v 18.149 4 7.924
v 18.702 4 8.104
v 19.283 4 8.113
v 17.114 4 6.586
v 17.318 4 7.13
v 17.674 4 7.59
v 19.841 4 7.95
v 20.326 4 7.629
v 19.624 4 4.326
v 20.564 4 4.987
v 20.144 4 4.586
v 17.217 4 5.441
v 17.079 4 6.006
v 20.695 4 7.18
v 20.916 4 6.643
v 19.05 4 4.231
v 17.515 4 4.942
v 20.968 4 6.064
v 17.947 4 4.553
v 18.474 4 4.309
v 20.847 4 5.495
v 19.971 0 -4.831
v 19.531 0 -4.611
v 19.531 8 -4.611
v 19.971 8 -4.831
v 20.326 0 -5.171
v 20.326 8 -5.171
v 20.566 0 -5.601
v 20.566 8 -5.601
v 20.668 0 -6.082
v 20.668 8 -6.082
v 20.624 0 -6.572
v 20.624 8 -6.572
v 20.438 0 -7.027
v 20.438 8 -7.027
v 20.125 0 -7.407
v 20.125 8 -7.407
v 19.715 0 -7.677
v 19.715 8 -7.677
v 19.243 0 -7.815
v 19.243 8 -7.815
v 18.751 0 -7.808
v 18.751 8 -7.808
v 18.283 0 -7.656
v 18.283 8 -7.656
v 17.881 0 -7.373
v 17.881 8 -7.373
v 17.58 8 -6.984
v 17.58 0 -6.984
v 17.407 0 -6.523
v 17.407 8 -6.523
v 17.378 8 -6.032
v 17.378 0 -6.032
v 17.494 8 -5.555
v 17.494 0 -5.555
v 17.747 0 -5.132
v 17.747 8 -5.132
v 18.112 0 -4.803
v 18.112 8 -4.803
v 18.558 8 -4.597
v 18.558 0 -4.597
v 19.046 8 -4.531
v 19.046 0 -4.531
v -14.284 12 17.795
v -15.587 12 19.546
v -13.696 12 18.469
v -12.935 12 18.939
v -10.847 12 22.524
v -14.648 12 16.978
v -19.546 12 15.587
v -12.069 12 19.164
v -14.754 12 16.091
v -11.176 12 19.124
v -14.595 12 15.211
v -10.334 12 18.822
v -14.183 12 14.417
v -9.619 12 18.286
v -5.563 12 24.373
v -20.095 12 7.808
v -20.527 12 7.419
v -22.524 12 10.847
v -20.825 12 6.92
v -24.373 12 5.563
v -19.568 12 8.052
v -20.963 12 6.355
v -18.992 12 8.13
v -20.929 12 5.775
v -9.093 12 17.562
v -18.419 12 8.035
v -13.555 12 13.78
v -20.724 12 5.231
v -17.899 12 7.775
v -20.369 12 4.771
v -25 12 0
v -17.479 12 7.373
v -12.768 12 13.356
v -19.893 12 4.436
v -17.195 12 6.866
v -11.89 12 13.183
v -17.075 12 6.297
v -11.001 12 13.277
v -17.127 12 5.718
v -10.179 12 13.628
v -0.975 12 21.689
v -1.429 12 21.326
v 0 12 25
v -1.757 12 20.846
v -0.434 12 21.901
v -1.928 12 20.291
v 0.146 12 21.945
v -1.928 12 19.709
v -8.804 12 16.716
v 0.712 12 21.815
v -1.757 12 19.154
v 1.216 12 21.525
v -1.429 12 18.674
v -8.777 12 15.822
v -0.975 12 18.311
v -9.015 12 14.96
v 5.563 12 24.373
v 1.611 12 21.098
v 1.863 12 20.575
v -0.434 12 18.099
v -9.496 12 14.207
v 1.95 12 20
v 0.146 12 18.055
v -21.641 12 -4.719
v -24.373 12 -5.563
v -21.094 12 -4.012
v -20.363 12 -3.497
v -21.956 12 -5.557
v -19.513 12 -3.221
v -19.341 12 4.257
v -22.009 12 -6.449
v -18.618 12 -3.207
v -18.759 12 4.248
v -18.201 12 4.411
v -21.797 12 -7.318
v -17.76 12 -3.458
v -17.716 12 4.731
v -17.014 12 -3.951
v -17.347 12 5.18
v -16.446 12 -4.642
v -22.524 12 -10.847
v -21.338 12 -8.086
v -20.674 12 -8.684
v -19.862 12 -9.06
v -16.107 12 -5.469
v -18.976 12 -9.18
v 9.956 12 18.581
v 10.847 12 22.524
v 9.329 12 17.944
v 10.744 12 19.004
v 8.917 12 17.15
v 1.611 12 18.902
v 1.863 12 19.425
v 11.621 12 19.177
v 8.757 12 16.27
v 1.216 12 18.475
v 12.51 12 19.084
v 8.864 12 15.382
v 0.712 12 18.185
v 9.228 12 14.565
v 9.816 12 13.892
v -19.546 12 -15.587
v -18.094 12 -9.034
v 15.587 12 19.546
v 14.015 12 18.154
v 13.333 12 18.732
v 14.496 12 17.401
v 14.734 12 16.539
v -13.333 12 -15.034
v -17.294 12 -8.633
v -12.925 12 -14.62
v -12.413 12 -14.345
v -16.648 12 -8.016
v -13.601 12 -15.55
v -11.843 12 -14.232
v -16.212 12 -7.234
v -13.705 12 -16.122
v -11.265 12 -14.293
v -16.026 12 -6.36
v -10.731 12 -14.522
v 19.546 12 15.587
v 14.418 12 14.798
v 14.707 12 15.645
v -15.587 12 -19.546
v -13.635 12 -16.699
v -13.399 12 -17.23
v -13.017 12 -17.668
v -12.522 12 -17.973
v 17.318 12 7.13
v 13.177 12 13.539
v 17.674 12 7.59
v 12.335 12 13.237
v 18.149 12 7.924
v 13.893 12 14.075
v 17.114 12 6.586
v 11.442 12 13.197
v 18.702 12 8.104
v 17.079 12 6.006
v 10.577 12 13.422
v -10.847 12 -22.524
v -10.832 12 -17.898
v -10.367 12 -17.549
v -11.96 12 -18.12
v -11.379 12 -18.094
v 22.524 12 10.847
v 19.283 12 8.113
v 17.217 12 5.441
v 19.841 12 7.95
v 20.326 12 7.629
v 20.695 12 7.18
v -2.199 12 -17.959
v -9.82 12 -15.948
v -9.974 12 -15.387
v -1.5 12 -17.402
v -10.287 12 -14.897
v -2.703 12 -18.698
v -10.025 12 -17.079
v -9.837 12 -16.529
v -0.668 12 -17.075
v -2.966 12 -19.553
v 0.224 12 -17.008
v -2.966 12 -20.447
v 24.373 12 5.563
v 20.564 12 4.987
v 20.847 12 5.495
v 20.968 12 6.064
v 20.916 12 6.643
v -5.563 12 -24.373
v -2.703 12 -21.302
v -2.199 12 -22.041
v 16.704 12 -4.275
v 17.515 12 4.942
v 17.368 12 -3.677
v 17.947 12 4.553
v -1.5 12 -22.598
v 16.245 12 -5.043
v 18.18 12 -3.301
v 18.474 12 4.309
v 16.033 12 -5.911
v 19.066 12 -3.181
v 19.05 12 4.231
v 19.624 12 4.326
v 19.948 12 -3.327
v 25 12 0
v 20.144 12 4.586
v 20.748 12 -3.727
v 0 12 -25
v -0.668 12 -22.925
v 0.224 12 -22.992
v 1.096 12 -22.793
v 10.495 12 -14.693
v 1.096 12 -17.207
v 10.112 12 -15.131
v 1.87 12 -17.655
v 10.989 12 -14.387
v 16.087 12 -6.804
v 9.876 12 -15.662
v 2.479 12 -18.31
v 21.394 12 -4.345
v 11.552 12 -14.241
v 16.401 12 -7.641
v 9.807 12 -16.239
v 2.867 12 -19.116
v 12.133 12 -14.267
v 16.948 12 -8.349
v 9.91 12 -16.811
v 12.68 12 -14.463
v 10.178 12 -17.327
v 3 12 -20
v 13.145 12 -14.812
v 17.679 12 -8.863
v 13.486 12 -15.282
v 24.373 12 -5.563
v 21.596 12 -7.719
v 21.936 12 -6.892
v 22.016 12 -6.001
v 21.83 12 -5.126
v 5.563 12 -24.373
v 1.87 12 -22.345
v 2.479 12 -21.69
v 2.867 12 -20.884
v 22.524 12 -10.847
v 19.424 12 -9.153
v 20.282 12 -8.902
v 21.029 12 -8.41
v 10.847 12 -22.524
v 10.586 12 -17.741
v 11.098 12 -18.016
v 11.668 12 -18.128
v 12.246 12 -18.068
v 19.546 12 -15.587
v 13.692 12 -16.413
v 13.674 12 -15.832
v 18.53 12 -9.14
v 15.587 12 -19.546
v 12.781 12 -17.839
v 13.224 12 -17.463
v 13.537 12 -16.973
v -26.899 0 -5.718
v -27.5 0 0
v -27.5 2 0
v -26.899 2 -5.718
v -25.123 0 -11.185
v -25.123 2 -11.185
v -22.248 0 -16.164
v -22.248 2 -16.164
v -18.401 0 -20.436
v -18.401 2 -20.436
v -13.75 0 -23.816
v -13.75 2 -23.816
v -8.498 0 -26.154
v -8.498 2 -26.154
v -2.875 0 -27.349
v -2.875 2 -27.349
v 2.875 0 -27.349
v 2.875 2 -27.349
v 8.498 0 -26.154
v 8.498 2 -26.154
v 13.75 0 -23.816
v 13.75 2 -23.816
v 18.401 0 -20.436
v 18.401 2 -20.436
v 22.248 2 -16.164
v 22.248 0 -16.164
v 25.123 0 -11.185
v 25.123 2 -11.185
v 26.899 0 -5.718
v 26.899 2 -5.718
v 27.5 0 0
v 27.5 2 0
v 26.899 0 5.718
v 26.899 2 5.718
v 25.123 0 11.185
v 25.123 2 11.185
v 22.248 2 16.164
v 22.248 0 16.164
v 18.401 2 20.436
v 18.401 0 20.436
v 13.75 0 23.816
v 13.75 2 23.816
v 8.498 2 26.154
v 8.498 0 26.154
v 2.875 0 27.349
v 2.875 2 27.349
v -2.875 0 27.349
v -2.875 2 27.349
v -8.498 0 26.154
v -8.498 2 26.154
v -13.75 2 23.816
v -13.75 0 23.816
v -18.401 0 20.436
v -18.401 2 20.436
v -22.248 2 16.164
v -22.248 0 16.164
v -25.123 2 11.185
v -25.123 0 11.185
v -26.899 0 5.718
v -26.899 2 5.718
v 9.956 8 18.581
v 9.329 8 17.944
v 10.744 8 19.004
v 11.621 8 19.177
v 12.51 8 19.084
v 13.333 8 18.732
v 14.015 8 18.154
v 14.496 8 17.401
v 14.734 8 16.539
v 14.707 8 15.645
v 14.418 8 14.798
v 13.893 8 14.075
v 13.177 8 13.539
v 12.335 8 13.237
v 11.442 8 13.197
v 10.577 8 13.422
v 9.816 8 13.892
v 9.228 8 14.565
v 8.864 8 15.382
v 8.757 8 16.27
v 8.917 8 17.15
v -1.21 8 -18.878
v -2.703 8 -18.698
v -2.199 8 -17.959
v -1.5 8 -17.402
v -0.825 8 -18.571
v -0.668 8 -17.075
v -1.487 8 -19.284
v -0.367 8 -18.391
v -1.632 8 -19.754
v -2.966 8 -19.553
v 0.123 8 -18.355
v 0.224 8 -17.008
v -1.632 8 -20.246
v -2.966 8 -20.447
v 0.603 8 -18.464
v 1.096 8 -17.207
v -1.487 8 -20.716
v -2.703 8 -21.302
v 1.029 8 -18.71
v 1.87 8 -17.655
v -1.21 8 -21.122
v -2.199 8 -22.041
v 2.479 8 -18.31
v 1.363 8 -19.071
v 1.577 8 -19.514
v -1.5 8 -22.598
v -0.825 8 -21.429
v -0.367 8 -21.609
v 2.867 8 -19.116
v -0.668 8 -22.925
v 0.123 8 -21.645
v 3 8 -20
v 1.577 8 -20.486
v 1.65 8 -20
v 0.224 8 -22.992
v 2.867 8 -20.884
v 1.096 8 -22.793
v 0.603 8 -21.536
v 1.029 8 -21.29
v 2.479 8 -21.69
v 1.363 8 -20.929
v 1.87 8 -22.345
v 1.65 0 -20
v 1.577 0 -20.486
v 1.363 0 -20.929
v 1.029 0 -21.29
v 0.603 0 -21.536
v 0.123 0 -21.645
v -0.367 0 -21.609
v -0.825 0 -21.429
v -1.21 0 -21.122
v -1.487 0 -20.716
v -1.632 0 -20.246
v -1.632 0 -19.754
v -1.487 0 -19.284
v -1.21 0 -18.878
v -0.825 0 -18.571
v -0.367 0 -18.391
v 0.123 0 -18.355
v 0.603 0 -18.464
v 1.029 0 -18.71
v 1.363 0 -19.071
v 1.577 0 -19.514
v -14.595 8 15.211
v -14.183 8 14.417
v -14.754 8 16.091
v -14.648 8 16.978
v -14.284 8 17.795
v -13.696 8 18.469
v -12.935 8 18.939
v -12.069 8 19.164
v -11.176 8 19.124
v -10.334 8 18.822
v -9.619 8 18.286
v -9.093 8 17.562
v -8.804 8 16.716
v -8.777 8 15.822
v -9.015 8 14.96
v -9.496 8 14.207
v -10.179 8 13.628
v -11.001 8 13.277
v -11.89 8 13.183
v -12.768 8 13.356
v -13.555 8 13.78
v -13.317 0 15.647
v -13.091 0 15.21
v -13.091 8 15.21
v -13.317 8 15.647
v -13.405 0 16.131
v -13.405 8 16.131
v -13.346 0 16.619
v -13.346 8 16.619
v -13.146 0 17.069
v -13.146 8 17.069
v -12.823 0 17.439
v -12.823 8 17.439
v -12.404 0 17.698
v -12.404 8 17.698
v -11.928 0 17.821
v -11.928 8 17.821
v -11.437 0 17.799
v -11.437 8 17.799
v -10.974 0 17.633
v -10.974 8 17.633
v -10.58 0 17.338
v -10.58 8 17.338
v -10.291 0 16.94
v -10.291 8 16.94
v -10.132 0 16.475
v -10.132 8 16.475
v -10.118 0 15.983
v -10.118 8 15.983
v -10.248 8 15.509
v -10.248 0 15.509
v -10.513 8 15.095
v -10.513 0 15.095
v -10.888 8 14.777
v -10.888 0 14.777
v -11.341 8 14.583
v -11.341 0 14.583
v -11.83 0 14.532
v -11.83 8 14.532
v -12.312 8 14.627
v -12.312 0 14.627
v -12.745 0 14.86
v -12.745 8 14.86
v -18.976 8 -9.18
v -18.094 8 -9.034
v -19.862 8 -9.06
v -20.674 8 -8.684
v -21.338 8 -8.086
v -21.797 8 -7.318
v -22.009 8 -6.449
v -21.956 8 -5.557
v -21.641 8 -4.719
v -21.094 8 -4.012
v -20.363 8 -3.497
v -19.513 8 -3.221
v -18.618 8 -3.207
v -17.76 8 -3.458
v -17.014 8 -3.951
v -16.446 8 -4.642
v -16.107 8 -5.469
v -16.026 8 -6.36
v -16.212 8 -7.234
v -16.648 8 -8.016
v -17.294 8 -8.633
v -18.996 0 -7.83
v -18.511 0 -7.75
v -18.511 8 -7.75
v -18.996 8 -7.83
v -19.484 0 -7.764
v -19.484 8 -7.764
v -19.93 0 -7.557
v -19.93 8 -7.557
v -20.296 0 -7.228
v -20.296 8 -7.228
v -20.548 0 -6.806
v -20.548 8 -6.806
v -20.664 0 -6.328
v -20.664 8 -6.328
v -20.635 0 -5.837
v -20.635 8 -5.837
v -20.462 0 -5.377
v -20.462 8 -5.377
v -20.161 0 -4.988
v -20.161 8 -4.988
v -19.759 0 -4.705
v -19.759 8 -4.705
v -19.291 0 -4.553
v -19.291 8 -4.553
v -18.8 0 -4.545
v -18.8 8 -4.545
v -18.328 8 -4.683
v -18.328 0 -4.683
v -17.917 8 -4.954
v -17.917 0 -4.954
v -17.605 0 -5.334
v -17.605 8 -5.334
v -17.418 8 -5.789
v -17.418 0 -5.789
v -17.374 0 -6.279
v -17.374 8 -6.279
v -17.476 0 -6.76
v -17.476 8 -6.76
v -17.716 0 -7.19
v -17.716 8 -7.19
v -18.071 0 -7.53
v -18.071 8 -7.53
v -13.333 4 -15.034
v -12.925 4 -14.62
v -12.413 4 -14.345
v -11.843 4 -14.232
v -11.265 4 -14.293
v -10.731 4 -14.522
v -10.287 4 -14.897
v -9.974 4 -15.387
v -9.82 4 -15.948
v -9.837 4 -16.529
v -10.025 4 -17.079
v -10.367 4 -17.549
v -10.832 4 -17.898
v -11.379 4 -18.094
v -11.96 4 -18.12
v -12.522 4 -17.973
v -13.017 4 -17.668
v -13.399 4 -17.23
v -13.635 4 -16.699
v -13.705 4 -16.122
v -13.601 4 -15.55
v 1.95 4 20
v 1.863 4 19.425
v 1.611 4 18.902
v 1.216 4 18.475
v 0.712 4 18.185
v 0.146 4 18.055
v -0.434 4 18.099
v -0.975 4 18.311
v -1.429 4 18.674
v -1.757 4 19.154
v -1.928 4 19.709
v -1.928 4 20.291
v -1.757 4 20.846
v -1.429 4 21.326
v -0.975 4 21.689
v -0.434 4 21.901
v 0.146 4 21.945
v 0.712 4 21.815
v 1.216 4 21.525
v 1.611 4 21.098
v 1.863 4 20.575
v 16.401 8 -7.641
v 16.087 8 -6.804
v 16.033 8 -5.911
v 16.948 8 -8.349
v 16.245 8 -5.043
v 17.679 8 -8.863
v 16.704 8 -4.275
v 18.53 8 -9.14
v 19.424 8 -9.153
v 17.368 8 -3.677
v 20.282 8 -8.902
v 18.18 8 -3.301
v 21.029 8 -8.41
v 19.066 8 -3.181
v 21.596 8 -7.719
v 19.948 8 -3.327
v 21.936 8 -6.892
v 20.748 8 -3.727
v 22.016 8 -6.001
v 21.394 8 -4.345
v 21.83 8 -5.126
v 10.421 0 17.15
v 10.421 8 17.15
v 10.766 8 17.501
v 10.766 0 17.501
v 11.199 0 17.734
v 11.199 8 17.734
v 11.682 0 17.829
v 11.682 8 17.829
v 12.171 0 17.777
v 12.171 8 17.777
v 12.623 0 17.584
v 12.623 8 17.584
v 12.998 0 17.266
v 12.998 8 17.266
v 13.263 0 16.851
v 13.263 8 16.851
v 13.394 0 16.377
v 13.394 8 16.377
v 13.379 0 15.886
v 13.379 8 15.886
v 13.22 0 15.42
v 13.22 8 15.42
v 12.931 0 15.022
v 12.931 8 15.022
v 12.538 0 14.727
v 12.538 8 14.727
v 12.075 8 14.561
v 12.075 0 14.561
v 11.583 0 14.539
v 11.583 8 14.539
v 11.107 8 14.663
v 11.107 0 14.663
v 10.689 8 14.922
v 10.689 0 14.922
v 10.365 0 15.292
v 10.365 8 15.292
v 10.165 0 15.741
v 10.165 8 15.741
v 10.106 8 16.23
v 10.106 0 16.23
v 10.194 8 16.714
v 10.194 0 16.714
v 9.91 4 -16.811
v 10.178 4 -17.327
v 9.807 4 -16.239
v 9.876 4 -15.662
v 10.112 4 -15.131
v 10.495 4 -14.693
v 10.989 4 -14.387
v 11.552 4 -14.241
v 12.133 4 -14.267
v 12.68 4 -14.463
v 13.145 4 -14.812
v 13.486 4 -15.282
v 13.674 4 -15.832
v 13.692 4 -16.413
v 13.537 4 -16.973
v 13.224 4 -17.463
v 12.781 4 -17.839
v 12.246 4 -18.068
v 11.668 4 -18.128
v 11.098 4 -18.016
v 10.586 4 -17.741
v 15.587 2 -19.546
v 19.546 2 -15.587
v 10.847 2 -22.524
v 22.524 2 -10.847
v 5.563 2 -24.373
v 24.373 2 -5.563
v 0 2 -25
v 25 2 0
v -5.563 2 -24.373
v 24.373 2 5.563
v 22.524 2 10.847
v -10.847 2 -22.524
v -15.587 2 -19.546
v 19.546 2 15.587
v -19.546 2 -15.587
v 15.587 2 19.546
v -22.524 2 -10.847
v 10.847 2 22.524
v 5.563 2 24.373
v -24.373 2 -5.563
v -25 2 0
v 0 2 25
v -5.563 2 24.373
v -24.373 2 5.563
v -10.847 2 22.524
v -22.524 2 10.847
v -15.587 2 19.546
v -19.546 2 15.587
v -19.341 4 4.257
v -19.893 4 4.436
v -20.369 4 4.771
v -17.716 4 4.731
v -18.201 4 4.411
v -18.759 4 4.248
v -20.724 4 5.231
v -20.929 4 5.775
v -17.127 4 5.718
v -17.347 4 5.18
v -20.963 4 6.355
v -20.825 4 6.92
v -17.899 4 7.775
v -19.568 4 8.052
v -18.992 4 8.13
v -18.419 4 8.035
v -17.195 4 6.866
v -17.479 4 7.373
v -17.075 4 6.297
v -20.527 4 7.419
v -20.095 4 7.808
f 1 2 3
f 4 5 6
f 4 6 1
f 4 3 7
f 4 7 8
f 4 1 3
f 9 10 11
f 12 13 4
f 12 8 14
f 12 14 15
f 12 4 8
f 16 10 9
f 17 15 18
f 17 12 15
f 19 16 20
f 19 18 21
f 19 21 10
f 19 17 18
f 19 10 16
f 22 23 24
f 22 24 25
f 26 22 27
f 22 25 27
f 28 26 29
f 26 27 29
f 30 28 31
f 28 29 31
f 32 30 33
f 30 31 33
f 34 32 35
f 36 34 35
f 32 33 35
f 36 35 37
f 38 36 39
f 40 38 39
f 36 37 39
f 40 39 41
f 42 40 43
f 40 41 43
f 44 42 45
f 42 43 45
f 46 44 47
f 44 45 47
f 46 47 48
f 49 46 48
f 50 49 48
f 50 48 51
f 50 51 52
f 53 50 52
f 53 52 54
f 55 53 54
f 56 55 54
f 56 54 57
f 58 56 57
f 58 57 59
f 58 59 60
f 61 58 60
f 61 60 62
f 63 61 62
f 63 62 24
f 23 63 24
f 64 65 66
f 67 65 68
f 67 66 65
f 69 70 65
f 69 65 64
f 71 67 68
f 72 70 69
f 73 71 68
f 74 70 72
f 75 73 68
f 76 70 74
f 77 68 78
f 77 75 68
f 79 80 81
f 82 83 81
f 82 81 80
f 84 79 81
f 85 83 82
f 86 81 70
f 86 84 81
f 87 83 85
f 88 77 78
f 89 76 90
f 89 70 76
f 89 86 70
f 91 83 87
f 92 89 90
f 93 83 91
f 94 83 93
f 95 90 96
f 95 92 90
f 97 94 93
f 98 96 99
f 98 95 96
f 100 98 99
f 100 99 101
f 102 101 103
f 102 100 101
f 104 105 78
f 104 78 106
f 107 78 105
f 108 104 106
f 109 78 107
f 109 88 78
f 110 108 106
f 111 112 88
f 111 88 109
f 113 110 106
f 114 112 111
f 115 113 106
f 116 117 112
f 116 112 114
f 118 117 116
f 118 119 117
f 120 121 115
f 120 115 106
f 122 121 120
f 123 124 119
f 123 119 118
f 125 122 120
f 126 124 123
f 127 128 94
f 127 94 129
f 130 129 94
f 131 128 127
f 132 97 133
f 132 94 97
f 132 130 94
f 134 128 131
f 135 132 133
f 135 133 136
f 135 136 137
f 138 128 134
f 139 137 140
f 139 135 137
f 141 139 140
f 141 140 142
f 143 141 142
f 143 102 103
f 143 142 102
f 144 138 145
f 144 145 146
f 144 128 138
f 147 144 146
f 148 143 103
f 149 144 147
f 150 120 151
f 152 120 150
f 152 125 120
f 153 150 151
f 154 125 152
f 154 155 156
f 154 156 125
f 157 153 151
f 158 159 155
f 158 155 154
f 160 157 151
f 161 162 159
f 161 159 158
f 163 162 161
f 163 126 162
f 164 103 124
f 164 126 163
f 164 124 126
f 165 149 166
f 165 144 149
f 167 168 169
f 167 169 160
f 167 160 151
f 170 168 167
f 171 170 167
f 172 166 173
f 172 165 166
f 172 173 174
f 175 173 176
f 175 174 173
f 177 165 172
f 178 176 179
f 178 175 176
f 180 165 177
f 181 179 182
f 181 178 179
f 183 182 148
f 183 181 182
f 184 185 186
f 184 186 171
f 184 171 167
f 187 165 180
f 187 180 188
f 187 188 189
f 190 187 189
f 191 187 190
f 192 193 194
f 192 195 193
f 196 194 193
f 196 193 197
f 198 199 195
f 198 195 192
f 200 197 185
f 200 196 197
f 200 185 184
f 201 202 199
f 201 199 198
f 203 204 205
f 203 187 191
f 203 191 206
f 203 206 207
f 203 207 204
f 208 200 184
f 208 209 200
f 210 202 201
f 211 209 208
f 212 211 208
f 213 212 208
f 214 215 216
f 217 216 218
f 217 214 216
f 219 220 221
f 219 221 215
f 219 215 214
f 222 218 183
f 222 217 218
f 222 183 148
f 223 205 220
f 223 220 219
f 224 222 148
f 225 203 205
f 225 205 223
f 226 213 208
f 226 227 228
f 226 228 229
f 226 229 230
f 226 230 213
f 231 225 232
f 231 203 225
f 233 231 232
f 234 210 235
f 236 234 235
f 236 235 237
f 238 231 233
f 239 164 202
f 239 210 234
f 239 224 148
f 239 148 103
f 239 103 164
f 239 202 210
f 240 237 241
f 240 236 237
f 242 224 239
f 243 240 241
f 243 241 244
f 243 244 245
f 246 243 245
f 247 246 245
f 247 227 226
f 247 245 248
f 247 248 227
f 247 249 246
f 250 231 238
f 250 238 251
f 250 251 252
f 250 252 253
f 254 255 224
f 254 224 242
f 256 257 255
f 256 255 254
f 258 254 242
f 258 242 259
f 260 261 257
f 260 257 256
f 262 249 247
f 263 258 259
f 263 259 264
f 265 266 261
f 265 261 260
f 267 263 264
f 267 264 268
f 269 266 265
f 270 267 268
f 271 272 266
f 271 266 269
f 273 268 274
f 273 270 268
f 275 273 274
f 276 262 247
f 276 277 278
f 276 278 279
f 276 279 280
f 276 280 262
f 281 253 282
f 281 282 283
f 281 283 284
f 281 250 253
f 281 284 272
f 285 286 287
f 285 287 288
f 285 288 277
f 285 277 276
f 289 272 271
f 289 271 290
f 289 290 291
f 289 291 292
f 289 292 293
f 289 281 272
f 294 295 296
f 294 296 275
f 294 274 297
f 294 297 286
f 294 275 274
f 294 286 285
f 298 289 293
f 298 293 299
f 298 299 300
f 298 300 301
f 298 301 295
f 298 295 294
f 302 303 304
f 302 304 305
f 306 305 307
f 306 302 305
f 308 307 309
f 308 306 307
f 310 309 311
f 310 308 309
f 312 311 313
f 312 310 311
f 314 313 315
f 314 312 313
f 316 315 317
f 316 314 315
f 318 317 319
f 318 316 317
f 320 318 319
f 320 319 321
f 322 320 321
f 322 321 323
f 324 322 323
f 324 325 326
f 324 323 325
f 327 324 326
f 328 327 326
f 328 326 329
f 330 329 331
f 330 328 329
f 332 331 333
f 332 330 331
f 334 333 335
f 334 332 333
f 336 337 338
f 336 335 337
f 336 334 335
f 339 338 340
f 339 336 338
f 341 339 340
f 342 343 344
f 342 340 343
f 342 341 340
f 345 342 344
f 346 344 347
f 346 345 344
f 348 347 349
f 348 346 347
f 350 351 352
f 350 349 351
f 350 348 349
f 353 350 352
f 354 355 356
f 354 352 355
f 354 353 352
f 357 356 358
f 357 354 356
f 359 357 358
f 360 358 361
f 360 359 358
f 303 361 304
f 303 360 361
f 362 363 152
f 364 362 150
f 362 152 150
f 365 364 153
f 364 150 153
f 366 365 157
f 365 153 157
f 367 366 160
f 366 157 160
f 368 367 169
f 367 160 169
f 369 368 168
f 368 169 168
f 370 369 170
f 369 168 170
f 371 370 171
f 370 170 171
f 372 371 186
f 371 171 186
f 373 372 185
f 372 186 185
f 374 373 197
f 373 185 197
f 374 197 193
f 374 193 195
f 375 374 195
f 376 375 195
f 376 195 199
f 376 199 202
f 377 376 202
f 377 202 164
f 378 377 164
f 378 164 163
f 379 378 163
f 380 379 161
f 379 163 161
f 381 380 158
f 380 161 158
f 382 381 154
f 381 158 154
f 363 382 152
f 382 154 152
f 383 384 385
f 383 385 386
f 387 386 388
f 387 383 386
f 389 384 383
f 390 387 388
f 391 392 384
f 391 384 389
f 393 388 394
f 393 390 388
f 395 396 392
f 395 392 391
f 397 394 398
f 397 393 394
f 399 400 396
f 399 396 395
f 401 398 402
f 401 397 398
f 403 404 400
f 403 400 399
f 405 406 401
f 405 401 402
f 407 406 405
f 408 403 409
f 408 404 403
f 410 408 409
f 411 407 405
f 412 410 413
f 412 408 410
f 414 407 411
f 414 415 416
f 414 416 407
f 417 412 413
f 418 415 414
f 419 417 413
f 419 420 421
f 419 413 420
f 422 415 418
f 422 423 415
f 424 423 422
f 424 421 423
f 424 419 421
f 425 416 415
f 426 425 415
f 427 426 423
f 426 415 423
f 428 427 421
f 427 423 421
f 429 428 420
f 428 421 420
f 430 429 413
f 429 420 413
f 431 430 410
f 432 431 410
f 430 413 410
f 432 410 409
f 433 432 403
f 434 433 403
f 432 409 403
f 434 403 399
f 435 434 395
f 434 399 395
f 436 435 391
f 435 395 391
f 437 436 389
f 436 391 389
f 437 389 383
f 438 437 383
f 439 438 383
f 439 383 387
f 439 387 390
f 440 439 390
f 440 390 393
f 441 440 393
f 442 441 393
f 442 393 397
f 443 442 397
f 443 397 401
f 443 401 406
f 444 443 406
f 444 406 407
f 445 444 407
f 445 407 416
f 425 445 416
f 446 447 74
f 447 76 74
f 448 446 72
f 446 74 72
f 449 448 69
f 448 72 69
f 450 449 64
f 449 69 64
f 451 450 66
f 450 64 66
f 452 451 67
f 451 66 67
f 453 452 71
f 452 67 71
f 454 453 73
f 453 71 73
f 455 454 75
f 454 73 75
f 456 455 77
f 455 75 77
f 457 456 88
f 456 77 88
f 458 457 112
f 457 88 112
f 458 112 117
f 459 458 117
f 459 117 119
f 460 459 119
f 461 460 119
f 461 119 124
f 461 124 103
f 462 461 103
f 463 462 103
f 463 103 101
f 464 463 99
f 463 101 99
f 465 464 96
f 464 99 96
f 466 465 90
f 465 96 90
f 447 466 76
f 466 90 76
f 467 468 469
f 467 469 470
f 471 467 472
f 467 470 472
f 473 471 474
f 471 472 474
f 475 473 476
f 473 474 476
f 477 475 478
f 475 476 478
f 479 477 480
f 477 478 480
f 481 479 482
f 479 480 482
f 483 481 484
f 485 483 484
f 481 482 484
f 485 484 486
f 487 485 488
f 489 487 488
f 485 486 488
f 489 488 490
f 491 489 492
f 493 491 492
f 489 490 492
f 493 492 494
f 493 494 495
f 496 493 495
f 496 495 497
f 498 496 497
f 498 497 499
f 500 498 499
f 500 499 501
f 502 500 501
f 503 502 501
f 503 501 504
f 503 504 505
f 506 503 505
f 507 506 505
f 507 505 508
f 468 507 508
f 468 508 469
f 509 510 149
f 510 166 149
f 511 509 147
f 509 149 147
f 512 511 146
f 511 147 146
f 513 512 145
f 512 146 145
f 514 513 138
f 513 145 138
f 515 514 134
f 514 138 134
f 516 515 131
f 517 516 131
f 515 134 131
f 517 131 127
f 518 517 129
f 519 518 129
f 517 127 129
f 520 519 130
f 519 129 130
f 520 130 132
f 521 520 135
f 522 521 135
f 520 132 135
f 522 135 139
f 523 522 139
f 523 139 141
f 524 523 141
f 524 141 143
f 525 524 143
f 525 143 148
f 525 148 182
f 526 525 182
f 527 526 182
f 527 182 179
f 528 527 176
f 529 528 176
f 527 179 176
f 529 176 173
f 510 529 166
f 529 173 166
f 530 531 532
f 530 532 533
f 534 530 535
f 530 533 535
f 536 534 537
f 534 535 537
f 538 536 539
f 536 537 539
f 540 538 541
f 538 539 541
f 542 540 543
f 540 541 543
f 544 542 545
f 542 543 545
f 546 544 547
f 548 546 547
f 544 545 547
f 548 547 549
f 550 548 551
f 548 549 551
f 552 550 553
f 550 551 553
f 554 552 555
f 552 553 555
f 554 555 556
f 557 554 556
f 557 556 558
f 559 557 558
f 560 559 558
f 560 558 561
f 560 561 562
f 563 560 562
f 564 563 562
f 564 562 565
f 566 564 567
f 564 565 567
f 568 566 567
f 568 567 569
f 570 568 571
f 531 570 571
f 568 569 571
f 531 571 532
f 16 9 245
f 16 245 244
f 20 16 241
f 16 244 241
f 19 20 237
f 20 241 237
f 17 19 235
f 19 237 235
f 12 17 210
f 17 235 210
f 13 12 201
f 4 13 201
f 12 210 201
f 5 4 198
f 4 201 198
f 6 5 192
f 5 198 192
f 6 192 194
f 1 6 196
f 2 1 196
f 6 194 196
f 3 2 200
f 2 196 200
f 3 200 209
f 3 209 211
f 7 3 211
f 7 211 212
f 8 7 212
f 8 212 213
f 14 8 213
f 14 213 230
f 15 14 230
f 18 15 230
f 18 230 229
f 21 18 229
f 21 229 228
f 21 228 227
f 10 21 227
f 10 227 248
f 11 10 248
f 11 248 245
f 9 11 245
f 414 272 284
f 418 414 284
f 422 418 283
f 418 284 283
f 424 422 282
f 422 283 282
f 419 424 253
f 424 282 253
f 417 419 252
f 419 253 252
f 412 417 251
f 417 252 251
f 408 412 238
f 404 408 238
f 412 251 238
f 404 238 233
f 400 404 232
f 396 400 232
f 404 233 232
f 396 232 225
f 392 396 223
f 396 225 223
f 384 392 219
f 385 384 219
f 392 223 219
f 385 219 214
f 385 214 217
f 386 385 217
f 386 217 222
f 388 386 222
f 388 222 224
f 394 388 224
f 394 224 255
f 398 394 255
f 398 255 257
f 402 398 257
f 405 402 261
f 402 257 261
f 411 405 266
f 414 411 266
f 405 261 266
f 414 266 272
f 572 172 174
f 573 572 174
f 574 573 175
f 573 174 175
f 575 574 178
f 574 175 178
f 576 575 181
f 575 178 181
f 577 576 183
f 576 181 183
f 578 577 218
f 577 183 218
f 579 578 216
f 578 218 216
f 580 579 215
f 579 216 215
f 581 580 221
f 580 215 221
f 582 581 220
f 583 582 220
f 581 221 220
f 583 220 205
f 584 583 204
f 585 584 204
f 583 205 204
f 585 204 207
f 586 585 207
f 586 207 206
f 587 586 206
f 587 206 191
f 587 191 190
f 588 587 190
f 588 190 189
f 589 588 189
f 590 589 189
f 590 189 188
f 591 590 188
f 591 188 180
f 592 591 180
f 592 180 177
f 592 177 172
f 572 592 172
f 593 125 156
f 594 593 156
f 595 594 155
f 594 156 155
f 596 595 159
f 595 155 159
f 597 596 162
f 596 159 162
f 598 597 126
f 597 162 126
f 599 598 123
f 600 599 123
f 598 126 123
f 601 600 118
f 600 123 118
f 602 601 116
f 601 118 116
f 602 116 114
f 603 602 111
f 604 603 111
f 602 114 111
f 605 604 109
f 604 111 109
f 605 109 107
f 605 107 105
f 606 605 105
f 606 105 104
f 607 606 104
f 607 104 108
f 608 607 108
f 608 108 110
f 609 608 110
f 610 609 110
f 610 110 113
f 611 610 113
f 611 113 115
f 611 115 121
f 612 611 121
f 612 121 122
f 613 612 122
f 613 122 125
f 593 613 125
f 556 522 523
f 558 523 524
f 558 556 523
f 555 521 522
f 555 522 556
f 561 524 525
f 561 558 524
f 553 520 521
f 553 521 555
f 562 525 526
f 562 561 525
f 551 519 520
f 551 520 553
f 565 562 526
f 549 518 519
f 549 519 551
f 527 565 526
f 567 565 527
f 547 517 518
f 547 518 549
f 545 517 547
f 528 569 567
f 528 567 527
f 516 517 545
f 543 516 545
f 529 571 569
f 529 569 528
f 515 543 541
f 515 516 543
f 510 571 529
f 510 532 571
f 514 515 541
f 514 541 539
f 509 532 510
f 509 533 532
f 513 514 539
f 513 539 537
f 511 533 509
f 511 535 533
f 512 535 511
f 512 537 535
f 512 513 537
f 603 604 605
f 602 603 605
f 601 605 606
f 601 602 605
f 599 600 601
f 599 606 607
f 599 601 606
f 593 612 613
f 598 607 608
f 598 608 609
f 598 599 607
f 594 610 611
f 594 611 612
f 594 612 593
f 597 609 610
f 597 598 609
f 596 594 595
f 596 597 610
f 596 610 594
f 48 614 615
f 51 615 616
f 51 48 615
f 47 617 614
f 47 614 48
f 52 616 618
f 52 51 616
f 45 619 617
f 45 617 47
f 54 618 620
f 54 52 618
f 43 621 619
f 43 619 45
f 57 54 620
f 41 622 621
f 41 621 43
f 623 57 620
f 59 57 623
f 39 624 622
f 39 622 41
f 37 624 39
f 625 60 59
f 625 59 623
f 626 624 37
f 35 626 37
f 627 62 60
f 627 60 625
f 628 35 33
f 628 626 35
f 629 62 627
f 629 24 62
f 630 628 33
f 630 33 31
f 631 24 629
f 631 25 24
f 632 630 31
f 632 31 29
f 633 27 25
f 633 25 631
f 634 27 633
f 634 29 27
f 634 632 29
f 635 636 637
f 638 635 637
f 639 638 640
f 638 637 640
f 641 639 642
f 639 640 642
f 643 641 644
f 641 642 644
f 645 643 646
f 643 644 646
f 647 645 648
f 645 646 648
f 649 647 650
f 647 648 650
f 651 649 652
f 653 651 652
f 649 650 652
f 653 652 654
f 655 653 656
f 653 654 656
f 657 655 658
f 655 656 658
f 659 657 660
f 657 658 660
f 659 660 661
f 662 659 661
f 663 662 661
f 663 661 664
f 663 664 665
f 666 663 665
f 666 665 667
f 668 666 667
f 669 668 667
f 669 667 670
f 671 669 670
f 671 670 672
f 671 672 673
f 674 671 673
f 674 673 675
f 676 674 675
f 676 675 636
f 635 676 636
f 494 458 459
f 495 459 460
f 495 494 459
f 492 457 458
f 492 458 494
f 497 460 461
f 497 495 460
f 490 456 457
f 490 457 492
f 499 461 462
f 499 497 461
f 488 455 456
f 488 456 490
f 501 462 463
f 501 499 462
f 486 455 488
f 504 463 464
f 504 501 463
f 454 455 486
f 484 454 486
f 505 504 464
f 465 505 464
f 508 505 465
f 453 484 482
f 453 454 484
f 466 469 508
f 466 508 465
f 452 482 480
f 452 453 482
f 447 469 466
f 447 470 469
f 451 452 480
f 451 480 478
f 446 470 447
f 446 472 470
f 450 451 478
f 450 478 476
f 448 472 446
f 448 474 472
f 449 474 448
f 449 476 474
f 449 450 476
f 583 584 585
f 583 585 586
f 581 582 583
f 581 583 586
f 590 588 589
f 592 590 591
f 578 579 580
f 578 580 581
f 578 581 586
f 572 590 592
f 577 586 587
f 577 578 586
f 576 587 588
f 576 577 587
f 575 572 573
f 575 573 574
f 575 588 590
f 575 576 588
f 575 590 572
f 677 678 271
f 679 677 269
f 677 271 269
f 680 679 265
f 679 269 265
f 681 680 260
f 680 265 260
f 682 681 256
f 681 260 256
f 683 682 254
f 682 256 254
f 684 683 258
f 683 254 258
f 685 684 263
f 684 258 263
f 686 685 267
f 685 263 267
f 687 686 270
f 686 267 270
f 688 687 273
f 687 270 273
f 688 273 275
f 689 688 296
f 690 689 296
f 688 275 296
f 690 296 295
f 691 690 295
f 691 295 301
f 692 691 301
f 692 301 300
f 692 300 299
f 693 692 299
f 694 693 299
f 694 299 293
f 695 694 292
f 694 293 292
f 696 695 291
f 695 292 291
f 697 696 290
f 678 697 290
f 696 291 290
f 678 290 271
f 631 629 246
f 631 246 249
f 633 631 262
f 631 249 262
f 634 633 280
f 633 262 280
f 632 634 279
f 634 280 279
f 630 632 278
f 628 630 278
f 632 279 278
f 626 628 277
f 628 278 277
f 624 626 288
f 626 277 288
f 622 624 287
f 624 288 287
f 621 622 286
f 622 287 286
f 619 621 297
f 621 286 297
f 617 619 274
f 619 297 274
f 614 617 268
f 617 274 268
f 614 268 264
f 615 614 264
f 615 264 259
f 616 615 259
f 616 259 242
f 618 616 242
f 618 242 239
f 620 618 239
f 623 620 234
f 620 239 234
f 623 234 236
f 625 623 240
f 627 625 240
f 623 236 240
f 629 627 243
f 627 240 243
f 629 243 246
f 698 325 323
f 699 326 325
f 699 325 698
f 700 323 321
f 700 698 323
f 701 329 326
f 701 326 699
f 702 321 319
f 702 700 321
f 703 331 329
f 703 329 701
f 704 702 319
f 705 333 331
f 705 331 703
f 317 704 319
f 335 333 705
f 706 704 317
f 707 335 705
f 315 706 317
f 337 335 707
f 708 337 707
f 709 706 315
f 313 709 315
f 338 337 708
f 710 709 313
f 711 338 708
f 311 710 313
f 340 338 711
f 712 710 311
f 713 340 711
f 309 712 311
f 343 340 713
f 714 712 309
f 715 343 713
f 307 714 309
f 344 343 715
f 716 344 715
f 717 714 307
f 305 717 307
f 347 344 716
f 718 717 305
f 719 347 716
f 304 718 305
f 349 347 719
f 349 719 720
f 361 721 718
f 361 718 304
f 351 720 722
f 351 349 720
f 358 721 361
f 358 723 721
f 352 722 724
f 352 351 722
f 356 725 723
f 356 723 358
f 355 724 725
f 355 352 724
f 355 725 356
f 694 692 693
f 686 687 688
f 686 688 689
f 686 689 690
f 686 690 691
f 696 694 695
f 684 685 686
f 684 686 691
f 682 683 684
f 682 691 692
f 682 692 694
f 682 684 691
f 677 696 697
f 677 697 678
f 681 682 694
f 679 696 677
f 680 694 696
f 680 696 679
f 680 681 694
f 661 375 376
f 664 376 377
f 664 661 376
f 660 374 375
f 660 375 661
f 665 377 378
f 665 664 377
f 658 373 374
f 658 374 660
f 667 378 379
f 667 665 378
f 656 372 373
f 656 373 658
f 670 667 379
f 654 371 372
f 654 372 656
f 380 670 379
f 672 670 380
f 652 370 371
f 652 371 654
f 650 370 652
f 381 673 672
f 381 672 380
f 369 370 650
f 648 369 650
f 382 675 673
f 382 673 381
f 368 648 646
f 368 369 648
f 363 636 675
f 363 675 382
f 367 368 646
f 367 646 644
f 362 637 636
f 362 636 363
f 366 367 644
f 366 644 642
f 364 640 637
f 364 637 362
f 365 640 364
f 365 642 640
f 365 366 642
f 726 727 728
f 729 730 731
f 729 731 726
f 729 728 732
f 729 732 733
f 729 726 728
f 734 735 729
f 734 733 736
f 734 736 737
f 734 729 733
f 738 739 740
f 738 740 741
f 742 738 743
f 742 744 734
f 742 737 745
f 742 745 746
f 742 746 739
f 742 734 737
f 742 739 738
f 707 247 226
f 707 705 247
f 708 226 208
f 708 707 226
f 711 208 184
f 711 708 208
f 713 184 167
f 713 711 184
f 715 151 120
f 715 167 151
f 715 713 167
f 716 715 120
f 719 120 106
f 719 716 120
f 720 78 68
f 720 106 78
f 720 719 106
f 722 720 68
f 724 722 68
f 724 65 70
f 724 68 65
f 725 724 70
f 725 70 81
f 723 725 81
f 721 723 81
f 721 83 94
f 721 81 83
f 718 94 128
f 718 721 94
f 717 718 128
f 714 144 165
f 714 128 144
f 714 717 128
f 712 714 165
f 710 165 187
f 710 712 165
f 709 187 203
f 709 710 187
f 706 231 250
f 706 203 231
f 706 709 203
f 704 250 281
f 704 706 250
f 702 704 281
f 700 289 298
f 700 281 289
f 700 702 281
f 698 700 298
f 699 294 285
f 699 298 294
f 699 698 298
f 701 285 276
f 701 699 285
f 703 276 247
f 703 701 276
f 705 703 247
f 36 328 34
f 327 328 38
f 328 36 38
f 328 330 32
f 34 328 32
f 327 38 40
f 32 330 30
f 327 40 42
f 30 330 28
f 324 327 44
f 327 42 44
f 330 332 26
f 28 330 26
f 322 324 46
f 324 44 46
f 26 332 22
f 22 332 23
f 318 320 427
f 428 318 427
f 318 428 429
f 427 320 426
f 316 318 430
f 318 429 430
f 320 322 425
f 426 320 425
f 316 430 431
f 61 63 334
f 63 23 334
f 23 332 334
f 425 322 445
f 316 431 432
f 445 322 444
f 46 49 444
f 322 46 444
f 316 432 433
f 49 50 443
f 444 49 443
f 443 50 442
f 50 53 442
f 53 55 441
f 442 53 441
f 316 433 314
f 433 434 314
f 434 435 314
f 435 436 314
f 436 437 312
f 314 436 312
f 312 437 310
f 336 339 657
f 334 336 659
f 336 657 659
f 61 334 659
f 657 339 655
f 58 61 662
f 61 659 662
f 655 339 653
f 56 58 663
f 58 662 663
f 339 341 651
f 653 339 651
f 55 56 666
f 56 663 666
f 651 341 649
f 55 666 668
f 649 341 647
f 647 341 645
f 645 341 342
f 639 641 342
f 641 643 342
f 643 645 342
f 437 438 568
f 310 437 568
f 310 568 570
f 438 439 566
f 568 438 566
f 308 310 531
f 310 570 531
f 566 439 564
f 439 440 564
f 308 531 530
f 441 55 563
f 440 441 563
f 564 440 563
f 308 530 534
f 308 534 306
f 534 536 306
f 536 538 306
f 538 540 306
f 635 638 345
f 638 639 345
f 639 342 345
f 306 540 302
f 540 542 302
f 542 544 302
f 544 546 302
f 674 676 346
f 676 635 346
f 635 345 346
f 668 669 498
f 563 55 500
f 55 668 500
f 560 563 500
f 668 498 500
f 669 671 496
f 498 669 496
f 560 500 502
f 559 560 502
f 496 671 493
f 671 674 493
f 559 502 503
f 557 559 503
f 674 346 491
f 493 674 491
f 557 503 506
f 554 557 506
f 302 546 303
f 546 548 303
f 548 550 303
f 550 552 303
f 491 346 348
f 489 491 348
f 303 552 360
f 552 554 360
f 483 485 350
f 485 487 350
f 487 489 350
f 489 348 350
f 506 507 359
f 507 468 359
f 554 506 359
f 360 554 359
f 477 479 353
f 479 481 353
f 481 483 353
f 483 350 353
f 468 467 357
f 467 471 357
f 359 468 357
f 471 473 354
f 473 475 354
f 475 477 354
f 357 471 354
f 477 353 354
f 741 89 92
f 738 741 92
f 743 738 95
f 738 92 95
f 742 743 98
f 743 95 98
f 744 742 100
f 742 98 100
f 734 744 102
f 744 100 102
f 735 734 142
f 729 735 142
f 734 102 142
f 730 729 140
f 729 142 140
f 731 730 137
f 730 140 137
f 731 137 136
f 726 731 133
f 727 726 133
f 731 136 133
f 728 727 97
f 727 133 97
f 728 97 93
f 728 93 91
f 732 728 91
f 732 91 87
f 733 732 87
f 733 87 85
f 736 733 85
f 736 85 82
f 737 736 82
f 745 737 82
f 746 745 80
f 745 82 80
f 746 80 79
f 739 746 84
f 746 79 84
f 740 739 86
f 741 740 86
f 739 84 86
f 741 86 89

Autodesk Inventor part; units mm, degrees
ref_plane "YZ Plane" through (0, 0, 0) normal (1, 0, 0) x (0, 1, 0)
ref_plane "XZ Plane" through (0, 0, 0) normal (0, 1, 0) x (-1, 0, 0)
ref_plane "XY Plane" through (0, 0, 0) normal (0, 0, 1) x (1, 0, 0)
sketch "Szkic4" plane through (0, 0, 0) normal (0, 1, 0) x (-1, 0, 0)
  circle A0 centre (0, 0) radius 27.5
  dimension "d13" = 55
extrude "Wyciągnięcie proste4" add sketch "Szkic4" along normal blind 2
sketch "Szkic5" plane through (0, 2, 0) normal (0, 1, 0) x (1, 0, 0)
  circle A0 centre (0, 0) radius 25
  dimension "d16" = 50
extrude "Wyciągnięcie proste5" add sketch "Szkic5" along normal blind 10
sketch "Szkic6" plane through (0, 12, 0) normal (0, 1, 0) x (1, 0, 0)
  circle A0 centre (0, 0) radius 20
  circle A1 centre (0, 20) radius 3
  dimension "d19" = 40
  dimension "d20" = 6
extrude "Wyciągnięcie proste6" cut sketch "Szkic6" against normal blind 4 contours A1 A0 | A0 A1 picked at (0, 18.9833) picked at (0.0861, 20.9796)
sketch "Szkic7" plane through (0, 8, -20) normal (0, 1, 0) x (1, 0, 0)
  circle A0 centre (0, 0) radius 1.65
  point P0 (0, -20)
  dimension "d23" = 3.3
extrude "Wyciągnięcie proste7" cut sketch "Szkic7" against normal through all
pattern_circular "Szyk kołowy2" count 5 over 360 about axis through (0, 2, 0) along (0, 1, 0) of "Wyciągnięcie proste6", "Wyciągnięcie proste7"
sketch "Szkic8" plane through (0, 12, 0) normal (0, 1, 0) x (1, 0, 0)
  circle A0 centre (0, 0) radius 20
  circle A1 centre (0, -20) radius 1.95
  dimension "d29" = 40
  dimension "d30" = 3.9
extrude "Wyciągnięcie proste8" cut sketch "Szkic8" against normal blind 8 contours A1 A0 | A0 A1 picked at (0.0759, -19.3474) picked at (0.0638, -20.6398)
pattern_circular "Szyk kołowy3" count 5 over 360 about axis through (0, 2, 0) along (0, 1, 0) of "Wyciągnięcie proste8"
properties part number "_Drukowanie 3D"
